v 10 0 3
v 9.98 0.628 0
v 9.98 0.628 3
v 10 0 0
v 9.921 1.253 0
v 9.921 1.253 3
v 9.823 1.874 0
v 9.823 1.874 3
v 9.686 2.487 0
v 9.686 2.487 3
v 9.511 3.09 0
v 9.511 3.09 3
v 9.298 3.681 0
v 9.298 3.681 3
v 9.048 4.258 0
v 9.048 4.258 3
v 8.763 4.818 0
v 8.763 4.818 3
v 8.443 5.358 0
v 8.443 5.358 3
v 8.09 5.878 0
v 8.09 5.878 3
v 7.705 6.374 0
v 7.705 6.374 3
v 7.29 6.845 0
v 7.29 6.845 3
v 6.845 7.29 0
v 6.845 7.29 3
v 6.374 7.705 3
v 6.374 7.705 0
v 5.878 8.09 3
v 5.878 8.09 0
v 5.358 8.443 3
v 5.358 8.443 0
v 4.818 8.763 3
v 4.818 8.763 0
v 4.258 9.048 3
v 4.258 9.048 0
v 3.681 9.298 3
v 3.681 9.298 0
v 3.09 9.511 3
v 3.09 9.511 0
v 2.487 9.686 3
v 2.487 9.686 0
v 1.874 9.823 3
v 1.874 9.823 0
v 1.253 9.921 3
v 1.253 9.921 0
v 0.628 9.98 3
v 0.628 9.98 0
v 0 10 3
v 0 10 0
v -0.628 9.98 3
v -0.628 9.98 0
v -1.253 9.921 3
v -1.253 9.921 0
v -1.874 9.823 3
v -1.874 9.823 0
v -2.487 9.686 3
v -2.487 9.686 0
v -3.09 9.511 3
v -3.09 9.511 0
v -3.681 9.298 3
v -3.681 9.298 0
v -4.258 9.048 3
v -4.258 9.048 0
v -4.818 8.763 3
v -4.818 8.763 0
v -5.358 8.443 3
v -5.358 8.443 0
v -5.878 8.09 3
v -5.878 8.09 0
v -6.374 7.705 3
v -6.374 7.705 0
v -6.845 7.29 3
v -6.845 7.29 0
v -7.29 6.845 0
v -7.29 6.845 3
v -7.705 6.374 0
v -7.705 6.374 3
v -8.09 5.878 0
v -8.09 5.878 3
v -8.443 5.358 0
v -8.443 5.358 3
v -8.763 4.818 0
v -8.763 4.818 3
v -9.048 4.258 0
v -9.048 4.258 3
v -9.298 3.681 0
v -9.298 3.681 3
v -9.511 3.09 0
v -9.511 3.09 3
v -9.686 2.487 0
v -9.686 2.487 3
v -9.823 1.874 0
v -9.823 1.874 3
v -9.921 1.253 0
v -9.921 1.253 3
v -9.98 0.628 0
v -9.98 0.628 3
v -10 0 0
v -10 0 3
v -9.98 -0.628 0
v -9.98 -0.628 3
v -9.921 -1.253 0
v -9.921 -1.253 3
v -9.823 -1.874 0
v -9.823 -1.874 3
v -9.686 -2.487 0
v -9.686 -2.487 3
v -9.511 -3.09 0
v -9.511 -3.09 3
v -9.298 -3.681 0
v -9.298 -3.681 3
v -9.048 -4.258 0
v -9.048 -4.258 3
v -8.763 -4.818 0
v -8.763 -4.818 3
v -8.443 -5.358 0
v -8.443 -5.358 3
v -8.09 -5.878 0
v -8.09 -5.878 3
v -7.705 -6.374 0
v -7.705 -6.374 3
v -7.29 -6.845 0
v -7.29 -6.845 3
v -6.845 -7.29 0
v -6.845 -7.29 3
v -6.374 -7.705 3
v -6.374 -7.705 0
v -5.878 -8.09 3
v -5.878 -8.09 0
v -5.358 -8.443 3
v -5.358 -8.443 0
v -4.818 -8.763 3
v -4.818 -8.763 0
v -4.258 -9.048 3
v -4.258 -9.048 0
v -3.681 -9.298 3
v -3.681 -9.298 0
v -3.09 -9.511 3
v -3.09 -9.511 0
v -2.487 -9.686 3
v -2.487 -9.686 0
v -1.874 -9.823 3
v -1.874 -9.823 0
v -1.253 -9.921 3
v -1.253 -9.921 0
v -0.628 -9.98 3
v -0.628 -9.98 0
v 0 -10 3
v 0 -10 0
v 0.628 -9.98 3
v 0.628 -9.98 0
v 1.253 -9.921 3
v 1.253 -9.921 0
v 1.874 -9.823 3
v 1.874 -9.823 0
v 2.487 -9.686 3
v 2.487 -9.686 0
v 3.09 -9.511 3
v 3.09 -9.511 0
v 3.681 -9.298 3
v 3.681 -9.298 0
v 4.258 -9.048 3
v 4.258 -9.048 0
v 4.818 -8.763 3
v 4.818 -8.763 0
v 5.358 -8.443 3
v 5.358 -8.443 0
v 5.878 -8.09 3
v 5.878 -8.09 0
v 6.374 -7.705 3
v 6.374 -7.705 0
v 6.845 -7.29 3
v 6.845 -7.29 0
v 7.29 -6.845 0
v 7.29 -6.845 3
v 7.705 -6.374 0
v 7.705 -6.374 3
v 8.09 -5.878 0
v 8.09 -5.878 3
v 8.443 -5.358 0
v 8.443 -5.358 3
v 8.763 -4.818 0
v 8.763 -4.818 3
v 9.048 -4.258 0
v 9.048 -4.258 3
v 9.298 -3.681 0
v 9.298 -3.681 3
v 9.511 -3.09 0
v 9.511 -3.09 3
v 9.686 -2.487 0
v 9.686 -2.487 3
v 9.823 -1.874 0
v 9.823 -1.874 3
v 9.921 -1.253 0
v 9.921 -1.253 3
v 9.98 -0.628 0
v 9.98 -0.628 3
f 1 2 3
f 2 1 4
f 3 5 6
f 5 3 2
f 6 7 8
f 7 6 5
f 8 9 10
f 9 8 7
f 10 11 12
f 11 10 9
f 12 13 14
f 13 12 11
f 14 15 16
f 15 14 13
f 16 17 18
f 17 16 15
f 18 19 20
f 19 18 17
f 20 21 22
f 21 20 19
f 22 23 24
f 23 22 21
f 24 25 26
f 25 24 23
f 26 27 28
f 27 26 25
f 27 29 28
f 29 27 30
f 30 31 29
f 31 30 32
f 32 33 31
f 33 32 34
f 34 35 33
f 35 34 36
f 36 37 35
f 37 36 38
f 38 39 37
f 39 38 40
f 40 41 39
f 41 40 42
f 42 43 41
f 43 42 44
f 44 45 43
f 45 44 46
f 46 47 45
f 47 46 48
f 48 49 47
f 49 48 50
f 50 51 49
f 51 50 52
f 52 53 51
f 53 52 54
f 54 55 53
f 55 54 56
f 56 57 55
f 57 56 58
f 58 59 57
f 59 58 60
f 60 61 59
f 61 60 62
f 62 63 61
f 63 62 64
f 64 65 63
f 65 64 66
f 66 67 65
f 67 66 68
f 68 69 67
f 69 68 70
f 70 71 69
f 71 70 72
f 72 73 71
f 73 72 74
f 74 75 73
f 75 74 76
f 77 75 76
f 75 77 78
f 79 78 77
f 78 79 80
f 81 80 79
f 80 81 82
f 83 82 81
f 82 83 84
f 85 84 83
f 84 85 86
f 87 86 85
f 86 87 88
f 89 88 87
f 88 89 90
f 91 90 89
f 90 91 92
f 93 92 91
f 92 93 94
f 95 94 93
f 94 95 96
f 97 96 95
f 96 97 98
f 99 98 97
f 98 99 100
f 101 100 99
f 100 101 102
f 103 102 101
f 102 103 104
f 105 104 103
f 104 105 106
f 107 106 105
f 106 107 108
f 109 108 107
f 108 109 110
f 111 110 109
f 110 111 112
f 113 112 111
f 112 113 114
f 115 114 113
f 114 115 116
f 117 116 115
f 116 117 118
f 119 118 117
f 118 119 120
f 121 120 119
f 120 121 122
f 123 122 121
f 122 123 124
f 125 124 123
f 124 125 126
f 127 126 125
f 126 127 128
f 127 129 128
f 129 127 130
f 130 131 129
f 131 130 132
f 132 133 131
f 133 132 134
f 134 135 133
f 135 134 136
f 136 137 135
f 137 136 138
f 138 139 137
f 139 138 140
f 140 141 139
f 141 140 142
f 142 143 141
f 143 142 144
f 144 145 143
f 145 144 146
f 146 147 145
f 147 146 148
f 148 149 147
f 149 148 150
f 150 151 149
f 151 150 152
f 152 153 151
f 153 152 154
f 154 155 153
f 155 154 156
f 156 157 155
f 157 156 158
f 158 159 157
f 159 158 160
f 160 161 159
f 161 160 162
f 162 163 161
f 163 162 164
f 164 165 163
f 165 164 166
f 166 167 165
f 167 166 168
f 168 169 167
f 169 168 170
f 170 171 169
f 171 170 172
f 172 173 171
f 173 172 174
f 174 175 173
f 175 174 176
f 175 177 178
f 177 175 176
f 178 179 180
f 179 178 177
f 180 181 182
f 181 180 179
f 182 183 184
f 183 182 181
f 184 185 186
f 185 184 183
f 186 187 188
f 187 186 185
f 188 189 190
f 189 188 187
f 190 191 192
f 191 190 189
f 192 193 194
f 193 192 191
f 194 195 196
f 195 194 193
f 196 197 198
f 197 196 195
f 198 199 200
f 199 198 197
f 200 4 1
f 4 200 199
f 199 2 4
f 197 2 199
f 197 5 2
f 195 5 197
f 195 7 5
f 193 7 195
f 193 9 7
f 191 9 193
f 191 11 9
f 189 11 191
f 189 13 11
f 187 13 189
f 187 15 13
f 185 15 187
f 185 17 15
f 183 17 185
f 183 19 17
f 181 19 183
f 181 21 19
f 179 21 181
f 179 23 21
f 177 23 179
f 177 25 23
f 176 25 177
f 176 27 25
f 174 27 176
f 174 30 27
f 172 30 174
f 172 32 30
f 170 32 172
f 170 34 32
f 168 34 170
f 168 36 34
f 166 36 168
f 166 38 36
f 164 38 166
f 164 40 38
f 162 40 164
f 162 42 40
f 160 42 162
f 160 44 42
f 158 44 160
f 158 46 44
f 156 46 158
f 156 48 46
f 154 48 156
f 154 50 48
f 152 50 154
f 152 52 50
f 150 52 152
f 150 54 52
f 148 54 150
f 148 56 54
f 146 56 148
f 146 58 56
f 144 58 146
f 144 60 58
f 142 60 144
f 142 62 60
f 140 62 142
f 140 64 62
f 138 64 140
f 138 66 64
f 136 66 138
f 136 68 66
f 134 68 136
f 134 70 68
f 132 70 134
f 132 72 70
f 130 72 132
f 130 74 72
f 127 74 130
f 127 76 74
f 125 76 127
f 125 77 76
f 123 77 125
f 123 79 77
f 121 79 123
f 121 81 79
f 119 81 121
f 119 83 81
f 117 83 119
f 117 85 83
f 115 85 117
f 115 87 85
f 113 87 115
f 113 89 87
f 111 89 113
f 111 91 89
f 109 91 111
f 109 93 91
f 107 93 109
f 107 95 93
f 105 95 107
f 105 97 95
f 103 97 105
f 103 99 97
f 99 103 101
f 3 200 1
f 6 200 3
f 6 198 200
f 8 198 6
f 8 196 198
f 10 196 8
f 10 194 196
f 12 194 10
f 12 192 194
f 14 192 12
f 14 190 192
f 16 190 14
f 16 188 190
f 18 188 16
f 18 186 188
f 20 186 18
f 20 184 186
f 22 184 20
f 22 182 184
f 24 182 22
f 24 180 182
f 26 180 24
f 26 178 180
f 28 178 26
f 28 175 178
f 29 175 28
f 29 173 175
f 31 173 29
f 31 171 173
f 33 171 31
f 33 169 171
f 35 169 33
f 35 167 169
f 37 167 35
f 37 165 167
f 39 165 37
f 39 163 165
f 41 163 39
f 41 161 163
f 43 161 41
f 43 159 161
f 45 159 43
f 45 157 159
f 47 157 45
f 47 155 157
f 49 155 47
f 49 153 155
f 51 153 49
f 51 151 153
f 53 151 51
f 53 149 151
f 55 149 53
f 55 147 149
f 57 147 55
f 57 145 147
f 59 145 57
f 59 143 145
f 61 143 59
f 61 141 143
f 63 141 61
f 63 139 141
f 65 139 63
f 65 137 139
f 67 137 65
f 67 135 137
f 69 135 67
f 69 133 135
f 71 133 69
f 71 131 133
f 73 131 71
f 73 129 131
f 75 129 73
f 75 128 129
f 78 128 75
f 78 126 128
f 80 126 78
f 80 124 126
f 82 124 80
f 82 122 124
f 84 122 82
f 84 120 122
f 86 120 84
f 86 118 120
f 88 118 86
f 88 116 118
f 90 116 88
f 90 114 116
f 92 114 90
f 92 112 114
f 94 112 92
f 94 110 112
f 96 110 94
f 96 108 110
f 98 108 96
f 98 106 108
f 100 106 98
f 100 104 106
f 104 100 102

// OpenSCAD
//-- Coin
//-- Juan Gonzalez-Gomez (juan@iearobotics.com)
//-- Nov-2010
//-- GPL license

//-- That's all!
cylinder(h=3, r=10, $fn=100);
